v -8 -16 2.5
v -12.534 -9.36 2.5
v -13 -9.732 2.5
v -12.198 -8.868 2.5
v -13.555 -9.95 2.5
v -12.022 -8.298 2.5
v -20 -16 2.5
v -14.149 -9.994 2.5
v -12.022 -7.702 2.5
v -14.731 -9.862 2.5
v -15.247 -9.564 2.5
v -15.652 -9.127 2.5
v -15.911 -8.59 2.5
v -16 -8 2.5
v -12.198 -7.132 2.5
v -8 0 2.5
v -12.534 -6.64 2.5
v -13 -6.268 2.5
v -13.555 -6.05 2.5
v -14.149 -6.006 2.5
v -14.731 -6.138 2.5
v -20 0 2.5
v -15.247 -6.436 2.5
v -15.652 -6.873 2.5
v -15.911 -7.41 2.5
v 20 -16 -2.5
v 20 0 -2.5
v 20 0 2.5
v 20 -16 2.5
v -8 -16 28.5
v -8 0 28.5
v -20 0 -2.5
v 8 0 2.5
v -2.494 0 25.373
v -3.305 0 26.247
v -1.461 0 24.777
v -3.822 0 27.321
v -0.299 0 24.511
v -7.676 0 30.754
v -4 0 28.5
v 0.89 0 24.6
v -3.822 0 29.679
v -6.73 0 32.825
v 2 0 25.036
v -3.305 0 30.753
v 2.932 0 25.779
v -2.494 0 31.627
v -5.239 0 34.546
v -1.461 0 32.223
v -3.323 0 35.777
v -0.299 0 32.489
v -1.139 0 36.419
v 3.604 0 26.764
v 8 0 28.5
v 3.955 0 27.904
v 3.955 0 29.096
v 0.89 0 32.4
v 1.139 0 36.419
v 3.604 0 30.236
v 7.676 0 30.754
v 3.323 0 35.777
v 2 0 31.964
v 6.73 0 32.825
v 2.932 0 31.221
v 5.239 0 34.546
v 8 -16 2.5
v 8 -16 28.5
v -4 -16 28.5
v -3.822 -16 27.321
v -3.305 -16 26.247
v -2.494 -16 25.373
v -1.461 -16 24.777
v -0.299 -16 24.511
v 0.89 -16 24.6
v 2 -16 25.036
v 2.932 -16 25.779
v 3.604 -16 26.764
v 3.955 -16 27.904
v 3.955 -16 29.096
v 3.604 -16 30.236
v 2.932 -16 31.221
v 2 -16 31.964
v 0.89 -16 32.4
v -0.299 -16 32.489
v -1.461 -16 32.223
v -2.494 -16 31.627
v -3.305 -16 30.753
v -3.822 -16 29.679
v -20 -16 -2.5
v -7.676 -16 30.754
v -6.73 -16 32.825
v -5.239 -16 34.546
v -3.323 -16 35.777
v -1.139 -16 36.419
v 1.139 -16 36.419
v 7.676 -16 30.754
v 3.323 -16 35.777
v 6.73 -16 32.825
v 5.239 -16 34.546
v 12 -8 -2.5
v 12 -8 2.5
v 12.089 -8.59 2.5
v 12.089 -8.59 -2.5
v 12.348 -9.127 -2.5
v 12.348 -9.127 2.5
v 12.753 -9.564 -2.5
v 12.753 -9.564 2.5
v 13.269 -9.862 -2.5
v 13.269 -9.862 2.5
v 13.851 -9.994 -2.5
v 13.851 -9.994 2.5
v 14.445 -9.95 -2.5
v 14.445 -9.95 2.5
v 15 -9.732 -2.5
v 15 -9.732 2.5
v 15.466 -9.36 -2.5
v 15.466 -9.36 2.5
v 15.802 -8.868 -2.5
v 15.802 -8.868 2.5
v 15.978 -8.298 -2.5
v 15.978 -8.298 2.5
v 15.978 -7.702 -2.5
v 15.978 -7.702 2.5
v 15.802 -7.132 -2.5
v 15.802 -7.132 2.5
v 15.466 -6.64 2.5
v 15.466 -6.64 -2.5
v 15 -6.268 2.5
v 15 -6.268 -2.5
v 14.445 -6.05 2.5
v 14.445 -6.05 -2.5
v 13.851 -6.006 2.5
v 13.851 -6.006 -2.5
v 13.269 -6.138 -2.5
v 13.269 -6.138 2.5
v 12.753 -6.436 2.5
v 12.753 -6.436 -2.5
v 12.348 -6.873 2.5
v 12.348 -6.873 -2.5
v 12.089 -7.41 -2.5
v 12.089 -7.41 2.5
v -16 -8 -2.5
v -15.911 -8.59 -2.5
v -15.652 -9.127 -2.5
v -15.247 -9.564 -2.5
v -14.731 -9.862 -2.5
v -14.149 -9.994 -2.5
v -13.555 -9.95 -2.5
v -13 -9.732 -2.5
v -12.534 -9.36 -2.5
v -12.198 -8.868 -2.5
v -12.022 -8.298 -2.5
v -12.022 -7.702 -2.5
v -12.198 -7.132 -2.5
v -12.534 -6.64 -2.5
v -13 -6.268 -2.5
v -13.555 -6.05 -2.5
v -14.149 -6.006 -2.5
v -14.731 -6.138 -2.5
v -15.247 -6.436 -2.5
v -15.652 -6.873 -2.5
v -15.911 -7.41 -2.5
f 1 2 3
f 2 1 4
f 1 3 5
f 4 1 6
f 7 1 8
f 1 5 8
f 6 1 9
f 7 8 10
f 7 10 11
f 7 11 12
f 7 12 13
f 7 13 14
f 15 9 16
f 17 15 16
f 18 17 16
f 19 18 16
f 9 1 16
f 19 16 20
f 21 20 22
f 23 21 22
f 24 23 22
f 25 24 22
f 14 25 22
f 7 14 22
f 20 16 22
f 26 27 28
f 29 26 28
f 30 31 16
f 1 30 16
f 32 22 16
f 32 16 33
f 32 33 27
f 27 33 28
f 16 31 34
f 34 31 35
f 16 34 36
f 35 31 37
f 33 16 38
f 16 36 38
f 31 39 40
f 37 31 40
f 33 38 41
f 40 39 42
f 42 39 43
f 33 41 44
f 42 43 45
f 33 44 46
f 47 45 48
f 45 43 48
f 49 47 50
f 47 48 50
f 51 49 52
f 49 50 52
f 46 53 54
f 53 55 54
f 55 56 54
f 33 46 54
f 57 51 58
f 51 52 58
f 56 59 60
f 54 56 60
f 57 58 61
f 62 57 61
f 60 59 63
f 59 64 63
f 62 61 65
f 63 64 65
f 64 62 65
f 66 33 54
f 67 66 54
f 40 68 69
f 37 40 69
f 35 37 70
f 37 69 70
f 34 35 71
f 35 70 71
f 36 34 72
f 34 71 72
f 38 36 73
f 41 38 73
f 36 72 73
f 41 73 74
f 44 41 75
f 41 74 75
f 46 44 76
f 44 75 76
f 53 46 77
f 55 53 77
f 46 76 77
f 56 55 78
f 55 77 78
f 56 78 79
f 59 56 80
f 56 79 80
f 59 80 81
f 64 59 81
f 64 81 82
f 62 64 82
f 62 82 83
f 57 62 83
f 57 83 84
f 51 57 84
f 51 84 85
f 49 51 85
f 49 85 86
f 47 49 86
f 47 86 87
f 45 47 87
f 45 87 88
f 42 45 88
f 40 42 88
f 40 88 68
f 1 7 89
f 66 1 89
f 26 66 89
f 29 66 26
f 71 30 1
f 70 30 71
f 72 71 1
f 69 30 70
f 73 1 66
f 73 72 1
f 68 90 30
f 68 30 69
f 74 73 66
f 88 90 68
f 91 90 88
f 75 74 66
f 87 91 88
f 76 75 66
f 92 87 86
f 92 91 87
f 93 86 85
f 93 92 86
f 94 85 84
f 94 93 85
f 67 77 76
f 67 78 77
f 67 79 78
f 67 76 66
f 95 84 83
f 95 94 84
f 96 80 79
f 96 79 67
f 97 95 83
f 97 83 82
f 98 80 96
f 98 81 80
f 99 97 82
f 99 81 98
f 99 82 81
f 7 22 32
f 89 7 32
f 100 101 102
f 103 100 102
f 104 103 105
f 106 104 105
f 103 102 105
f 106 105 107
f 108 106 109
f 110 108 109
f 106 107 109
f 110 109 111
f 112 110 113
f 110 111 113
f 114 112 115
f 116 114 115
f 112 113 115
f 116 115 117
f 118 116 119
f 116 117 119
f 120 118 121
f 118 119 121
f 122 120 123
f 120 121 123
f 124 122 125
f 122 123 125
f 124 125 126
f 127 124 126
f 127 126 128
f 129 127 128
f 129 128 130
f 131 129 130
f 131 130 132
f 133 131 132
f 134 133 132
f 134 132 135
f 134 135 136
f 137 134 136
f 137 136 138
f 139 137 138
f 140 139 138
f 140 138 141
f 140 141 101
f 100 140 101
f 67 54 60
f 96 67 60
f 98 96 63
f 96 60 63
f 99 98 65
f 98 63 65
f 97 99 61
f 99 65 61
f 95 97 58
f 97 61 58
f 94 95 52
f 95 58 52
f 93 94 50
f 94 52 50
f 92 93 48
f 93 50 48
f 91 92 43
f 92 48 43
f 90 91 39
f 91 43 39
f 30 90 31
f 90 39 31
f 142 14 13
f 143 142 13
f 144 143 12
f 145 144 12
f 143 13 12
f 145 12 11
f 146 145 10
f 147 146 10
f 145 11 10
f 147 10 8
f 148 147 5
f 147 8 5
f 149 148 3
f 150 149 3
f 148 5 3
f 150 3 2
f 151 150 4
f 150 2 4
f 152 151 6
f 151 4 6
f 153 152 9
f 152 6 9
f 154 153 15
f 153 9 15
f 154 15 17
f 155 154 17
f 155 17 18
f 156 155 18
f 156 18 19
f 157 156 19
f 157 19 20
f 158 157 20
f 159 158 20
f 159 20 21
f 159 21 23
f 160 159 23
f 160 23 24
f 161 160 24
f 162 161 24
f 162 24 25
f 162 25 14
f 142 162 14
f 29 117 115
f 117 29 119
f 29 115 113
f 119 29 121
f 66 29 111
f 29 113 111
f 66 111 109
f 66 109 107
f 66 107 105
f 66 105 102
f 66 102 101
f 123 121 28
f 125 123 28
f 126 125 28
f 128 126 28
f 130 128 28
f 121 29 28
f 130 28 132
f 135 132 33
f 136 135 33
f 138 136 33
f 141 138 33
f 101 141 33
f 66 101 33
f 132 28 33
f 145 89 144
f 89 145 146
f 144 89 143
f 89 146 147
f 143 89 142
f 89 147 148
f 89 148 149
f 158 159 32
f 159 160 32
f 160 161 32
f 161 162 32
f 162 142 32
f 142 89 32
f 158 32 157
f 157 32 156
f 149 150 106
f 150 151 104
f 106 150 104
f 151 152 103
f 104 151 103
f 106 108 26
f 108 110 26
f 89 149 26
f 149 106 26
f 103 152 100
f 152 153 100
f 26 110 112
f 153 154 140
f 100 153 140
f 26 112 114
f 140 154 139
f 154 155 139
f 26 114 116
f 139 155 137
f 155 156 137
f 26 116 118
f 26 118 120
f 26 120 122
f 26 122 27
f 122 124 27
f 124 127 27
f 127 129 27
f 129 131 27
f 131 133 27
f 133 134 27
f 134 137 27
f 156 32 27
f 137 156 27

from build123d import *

# Parameters (mm, degrees)
F1_DEPTH = 16
F2_D     = 8
F4_D     = 4


with BuildPart() as f1:
    # F0 (on Front) → F1 (new body)
    with BuildSketch(Plane.XZ):
        with BuildLine():
            Line((-8, 2.5), (-20, 2.5))
            Line((-20, 2.5), (-20, -2.5))
            Line((-20, -2.5), (20, -2.5))
            Line((20, -2.5), (20, 2.5))
            Line((20, 2.5), (8, 2.5))
            Line((8, 2.5), (8, 28.5))
            ThreePointArc((8, 28.5), (0, 36.5), (-8, 28.5))
            Line((-8, 28.5), (-8, 2.5))
        make_face()
    extrude(amount=F1_DEPTH)

    # F2 (through all)
    with Locations(Plane(origin=(0, 0, 0), x_dir=(1, 0, 0), z_dir=(0, 1, 0))):
        with Locations((0, -28.5)):
            Hole(F2_D / 2)

    # F4 (through all)
    with Locations(Plane(origin=(0, 0, -2.5), x_dir=(1, 0, 0), z_dir=(0, 0, -1))):
        with Locations((-14, 8), (14, 8)):
            Hole(F4_D / 2)


solid = f1.part
